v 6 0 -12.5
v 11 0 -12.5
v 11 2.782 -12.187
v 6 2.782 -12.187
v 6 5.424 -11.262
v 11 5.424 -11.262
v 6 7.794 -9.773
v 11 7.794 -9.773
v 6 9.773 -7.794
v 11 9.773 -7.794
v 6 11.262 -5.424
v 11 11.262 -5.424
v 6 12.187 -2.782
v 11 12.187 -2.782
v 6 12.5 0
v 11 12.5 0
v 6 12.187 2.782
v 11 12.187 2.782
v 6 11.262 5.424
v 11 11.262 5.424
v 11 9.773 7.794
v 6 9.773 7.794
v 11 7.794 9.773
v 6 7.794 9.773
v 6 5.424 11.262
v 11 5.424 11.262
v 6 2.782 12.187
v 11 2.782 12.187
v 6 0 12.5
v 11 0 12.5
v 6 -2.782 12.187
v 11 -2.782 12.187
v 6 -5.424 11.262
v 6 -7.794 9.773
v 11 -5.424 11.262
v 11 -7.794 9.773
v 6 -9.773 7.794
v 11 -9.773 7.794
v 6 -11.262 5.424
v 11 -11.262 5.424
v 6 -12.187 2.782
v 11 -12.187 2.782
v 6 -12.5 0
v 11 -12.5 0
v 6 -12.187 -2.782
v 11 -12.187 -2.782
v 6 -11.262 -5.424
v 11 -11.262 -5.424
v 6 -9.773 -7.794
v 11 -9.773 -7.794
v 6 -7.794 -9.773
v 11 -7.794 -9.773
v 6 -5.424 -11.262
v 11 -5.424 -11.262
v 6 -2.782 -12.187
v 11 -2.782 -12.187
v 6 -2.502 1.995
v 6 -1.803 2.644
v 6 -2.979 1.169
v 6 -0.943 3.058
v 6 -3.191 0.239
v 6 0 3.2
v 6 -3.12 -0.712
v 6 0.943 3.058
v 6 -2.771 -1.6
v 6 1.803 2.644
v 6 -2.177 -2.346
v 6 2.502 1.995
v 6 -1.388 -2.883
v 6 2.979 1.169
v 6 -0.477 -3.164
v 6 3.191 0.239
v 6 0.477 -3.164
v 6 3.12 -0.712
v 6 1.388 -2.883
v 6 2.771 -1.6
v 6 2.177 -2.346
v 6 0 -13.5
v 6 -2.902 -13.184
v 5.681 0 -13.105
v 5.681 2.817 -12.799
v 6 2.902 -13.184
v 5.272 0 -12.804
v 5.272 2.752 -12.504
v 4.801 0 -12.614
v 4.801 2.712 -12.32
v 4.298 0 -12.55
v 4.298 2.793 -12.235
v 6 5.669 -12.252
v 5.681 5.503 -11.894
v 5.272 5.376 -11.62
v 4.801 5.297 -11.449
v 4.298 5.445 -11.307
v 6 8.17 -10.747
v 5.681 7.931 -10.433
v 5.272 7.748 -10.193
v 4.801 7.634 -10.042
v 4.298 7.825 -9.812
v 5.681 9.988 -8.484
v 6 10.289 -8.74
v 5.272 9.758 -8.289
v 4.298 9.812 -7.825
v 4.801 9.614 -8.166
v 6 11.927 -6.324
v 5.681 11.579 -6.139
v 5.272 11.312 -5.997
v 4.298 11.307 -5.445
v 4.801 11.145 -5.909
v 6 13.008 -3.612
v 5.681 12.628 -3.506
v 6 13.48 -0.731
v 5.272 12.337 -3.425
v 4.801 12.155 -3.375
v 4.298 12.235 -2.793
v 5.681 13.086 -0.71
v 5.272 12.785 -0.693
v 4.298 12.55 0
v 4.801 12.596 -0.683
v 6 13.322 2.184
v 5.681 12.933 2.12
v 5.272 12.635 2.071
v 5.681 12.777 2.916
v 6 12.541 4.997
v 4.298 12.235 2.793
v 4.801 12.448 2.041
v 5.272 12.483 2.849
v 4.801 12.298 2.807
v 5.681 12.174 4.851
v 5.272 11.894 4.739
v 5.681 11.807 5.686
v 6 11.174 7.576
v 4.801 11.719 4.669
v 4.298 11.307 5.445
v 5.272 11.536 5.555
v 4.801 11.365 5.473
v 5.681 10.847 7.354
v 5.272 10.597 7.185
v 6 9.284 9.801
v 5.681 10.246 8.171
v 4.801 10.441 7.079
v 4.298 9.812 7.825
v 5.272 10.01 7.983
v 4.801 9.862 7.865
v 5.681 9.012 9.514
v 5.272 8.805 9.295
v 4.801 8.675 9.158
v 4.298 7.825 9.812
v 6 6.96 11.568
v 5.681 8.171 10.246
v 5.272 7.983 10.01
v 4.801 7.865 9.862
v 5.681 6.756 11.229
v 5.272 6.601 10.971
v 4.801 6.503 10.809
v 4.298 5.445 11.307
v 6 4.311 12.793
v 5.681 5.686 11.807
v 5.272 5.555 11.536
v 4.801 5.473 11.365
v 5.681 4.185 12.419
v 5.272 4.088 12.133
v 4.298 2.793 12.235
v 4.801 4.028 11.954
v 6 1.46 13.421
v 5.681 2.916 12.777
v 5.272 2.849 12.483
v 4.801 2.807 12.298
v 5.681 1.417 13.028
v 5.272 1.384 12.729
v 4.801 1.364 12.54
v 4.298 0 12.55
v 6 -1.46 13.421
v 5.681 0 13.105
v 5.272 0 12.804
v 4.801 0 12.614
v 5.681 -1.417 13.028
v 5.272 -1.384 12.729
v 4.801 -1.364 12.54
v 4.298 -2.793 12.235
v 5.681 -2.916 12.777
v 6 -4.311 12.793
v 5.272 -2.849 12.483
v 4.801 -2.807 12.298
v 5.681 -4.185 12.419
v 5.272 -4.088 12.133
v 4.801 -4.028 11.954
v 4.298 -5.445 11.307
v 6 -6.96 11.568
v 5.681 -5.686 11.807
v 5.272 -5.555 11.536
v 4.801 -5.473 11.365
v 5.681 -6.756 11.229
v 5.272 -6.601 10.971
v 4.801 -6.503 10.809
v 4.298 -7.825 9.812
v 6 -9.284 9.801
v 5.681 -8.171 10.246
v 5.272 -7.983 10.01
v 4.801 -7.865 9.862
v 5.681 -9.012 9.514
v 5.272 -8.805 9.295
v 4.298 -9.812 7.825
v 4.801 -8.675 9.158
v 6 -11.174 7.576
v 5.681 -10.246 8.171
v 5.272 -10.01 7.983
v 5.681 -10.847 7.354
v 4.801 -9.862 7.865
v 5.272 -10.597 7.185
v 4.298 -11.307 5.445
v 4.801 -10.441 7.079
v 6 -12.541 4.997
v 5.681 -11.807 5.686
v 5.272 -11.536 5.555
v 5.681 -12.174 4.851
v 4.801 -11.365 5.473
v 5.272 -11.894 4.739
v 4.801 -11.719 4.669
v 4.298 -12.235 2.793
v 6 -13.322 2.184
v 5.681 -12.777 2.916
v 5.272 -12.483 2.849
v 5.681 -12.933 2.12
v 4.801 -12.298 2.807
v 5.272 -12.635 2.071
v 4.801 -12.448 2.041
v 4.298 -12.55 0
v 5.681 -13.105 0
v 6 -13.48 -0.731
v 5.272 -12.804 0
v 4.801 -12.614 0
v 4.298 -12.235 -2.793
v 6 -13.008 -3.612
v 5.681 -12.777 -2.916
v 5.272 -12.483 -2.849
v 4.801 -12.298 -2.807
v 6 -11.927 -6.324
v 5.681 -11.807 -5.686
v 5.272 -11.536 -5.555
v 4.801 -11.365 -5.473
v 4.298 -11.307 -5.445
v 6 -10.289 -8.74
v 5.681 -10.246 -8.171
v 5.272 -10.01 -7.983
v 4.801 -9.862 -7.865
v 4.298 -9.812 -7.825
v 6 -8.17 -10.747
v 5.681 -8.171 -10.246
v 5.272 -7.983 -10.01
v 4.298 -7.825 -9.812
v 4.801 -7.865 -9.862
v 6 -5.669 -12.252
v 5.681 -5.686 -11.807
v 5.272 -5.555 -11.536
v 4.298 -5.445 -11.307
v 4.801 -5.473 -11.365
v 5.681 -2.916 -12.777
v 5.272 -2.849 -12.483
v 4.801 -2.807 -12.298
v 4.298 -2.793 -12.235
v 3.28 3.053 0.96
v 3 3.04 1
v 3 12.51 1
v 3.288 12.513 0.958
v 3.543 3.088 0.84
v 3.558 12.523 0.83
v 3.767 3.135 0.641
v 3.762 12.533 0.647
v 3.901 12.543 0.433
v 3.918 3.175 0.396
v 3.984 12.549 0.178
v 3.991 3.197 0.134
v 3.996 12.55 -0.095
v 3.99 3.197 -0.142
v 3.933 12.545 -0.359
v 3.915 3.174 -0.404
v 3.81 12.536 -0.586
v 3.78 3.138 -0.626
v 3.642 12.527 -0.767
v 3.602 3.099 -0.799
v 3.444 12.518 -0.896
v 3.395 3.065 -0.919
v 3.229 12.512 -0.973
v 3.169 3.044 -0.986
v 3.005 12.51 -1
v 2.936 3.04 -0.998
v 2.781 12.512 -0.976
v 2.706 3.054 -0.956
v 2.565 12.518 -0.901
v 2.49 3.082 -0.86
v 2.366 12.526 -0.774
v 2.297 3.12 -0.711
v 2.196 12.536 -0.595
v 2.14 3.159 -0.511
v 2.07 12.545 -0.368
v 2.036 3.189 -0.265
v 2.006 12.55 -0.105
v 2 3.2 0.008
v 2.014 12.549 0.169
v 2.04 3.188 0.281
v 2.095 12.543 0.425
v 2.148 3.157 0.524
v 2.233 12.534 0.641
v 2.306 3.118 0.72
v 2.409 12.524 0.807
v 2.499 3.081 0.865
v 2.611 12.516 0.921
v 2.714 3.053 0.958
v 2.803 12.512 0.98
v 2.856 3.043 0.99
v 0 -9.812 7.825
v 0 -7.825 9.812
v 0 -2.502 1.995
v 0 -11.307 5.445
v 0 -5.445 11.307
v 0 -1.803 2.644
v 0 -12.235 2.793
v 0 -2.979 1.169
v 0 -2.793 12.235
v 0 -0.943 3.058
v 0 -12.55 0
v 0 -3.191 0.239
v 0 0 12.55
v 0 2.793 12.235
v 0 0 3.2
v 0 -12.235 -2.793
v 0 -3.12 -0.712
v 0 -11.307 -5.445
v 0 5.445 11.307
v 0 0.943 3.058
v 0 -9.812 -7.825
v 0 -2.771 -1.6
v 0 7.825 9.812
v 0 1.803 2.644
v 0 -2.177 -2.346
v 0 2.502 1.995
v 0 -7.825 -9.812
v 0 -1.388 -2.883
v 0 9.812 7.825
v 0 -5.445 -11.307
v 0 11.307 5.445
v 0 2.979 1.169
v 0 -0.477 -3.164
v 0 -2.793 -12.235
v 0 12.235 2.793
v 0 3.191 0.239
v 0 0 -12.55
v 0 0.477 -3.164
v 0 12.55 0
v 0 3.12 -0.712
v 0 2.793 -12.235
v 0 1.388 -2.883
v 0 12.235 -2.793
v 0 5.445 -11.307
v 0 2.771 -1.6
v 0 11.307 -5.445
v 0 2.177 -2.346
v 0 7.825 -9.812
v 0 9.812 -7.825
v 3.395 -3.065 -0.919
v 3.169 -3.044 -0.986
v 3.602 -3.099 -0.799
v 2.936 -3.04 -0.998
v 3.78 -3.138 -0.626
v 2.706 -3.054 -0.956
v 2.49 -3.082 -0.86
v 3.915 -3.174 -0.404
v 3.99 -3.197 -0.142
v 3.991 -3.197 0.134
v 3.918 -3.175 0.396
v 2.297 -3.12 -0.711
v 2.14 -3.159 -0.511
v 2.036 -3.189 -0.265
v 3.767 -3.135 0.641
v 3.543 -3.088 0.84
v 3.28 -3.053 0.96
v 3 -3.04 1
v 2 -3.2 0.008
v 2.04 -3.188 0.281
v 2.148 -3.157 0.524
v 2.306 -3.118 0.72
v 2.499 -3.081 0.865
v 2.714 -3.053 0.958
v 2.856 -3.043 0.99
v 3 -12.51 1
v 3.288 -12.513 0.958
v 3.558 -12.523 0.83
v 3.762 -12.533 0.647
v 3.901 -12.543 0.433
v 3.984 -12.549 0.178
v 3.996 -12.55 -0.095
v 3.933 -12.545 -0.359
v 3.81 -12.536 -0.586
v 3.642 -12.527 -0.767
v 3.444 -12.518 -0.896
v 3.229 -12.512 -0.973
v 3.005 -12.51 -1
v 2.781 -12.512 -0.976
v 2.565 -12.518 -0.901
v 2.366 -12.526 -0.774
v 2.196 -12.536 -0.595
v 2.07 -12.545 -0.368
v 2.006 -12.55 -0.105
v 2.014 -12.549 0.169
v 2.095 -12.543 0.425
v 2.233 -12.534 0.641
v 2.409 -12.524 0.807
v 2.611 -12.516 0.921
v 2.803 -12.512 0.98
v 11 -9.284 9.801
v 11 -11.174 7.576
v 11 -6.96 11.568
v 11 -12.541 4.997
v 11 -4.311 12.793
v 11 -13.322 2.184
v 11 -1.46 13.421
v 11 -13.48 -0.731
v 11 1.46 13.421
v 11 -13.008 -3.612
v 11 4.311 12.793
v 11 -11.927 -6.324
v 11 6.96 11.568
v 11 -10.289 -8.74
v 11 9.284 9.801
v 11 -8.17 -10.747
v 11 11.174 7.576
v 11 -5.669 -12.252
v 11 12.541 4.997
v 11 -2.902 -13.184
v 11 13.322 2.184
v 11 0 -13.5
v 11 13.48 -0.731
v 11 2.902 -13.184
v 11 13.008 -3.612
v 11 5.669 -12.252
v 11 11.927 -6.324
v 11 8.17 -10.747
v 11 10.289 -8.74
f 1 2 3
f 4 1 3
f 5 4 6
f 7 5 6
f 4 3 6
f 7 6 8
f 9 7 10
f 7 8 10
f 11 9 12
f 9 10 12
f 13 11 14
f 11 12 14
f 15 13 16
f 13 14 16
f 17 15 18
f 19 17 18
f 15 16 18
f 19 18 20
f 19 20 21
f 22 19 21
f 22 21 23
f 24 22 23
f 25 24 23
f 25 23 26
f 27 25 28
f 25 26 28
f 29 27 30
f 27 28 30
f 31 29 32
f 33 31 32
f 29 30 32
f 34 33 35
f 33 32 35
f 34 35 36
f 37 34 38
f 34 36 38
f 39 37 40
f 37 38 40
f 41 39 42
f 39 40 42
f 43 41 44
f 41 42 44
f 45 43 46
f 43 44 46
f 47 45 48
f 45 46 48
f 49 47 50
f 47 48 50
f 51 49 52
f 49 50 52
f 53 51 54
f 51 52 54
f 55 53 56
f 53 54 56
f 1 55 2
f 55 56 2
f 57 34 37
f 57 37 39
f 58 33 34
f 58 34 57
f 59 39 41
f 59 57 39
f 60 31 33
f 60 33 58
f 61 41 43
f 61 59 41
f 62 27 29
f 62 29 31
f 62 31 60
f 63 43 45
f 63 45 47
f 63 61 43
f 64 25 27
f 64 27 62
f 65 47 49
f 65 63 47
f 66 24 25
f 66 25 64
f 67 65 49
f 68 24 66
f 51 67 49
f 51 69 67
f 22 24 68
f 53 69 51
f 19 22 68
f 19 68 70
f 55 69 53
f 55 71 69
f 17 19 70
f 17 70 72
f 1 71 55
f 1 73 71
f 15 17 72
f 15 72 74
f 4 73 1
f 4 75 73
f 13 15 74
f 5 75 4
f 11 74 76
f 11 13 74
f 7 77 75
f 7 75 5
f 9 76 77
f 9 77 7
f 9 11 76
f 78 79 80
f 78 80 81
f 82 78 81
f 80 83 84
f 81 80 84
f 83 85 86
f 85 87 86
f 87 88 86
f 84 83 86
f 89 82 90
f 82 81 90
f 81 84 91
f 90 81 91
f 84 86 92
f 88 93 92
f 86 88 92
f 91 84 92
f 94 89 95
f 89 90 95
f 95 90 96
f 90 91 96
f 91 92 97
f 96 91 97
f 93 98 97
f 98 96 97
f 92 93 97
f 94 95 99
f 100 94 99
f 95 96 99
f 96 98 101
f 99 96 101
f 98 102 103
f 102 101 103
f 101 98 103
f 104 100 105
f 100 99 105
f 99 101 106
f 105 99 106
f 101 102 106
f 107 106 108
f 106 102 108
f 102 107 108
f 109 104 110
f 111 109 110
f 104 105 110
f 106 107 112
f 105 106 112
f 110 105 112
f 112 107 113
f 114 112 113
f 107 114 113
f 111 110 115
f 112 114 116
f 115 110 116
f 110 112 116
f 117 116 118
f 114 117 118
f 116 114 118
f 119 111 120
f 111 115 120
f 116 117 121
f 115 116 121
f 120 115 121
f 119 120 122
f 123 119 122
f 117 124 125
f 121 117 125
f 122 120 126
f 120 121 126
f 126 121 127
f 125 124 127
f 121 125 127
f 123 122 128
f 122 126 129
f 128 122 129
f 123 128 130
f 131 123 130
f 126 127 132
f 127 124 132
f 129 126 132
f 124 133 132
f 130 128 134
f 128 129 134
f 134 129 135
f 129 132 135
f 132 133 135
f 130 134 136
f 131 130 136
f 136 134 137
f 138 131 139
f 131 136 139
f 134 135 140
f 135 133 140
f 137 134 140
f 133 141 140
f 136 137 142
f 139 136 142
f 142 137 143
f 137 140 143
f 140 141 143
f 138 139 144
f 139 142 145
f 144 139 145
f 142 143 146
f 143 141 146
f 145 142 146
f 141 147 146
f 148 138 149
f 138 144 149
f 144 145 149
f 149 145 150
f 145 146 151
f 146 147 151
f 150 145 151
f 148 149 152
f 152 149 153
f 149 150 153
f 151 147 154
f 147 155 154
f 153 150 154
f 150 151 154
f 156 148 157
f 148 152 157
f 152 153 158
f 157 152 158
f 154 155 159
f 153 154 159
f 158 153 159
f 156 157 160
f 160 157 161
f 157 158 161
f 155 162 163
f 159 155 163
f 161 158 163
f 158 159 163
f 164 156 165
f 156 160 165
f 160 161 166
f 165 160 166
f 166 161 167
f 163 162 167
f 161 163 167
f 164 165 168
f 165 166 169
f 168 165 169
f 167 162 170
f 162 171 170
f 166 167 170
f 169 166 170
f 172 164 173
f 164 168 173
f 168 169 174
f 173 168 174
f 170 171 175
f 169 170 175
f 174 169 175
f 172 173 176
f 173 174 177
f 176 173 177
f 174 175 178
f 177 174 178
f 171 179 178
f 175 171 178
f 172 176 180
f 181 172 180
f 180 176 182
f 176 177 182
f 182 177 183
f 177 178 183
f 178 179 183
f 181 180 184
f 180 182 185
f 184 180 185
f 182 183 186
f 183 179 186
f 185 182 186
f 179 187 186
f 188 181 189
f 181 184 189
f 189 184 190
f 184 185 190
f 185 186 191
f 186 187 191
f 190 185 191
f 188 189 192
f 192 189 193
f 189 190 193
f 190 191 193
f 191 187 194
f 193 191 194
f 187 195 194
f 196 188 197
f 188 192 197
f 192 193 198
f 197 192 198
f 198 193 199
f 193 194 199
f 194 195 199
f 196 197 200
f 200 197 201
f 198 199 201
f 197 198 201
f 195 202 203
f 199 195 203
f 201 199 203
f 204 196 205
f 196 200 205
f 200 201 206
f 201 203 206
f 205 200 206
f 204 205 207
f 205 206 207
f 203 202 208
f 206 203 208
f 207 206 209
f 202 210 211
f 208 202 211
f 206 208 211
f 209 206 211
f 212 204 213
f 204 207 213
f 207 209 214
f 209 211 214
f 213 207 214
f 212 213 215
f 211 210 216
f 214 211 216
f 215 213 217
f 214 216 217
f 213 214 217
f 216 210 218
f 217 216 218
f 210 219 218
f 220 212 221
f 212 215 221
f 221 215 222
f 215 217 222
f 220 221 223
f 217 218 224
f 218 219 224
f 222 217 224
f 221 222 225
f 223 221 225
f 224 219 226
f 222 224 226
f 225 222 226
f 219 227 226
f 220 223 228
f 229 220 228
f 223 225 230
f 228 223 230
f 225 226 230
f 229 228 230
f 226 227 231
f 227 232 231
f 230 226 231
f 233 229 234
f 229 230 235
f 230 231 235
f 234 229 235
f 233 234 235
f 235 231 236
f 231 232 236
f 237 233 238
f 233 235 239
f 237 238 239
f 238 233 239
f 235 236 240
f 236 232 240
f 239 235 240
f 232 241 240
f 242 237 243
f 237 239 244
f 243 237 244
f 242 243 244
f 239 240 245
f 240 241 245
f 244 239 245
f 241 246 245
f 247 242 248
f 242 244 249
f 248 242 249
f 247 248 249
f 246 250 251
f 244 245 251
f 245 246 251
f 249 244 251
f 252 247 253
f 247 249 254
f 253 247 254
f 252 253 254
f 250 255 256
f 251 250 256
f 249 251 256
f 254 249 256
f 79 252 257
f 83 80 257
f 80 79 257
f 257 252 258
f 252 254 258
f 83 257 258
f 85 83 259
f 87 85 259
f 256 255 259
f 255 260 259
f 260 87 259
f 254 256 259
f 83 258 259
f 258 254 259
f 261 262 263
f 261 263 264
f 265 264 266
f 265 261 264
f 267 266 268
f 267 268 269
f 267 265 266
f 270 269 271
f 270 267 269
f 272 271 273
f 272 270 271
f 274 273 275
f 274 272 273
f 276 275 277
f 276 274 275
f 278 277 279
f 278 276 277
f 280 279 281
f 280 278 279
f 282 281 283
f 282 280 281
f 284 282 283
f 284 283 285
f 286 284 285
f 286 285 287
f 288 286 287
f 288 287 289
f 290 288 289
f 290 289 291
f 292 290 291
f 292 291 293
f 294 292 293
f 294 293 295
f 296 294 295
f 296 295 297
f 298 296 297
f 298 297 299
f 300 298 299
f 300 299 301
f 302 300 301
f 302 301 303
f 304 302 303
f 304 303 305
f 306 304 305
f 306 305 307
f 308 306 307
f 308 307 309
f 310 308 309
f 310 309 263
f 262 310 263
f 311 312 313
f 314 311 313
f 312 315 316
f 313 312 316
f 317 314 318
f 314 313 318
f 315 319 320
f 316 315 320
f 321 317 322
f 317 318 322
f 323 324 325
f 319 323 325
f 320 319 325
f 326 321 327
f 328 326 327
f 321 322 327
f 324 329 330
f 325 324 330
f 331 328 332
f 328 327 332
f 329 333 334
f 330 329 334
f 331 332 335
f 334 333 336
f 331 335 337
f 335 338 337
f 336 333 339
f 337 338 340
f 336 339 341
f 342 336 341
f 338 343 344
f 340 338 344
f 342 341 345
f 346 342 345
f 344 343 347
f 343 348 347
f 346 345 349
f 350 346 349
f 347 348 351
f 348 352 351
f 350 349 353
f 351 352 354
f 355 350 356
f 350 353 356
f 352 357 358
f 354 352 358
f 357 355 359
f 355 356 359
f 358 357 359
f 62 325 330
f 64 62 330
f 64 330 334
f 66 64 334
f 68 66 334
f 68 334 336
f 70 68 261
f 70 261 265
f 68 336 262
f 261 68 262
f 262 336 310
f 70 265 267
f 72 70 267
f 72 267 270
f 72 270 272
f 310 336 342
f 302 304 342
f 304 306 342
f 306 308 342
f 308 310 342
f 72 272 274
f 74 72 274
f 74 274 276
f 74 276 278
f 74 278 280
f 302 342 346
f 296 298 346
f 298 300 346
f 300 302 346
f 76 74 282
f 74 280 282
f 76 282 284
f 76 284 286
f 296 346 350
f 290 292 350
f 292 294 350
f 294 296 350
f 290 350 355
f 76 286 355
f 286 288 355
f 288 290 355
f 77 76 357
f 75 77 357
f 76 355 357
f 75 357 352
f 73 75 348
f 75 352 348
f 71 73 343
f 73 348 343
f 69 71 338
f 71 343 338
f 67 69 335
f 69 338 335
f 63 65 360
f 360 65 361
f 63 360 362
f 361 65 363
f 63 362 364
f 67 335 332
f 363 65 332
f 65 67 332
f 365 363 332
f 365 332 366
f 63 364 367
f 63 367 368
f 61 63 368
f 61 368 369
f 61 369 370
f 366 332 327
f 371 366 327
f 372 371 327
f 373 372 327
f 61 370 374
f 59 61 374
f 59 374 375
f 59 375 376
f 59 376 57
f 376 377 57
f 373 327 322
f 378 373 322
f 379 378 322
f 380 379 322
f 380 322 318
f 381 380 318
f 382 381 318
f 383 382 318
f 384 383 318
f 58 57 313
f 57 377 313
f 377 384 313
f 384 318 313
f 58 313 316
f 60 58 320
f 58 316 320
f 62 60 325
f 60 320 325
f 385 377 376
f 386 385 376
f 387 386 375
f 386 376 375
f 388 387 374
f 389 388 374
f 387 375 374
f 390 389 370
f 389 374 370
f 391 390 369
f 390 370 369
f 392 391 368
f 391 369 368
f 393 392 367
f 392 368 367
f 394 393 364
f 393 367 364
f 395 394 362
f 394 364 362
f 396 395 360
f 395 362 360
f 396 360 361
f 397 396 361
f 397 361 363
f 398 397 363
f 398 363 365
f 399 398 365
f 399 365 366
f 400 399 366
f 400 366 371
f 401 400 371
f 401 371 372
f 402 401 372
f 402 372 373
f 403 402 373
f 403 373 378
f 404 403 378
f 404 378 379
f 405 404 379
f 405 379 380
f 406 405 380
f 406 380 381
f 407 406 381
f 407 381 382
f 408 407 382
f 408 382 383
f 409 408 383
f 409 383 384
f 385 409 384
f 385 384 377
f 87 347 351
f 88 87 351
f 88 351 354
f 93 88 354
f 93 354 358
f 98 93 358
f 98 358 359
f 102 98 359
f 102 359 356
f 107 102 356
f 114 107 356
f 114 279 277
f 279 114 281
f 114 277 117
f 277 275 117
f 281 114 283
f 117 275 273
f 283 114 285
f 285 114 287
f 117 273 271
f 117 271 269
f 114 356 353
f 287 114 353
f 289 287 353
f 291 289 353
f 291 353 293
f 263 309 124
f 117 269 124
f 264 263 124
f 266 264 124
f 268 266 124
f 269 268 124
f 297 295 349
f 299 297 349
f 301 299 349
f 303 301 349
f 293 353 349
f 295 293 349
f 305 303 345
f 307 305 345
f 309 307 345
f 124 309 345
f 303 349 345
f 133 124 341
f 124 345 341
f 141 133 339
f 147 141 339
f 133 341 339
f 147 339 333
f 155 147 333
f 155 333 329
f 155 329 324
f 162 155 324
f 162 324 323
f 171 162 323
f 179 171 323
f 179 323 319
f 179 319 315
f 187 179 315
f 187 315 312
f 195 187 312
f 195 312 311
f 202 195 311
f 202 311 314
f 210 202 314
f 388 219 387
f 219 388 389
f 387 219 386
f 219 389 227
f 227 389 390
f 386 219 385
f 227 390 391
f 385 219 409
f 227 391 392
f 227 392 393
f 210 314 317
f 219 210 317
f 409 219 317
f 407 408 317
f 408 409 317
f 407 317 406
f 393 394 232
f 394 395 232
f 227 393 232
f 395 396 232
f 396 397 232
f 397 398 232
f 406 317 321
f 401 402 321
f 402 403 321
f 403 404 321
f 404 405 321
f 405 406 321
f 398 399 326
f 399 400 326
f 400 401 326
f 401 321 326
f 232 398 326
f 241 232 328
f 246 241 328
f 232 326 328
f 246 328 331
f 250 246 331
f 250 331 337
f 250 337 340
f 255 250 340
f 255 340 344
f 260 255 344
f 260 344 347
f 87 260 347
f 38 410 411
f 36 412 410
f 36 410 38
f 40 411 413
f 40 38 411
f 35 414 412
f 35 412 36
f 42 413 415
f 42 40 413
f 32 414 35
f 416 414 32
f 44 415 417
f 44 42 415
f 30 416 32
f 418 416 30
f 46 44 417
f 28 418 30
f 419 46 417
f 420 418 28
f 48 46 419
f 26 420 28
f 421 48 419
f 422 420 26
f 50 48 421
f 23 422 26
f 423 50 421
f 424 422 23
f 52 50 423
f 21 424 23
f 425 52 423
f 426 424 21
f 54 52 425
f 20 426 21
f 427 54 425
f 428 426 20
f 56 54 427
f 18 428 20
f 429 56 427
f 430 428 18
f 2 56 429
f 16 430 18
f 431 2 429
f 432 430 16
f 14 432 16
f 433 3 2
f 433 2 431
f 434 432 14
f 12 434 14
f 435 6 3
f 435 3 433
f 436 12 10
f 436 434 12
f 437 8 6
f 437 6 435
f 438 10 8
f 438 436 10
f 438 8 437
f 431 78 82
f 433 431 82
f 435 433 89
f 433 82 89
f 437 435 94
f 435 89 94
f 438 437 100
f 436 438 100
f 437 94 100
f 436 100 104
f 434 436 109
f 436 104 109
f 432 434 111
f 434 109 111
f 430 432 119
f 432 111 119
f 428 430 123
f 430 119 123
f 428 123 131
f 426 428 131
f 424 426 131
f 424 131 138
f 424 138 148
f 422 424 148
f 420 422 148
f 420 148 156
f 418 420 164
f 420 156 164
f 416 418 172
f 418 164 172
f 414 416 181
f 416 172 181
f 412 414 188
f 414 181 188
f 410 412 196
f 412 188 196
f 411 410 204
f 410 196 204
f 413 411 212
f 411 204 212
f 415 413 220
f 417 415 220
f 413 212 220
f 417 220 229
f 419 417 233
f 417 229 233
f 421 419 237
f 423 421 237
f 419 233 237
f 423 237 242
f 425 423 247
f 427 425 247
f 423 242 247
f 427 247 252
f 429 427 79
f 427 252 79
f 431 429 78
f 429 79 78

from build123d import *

# Parameters (mm, degrees)
SKETCH_1_R                      = 12.55
EXTRUDE_1_DEPTH                 = 6
SKETCH_2_R                      = 3.2
CUT_EXTRUDE_1_DEPTH             = 6
CUT_EXTRUDE_2_REACH             = 20.735
SKETCH_3_R                      = 1
CUT_EXTRUDE_2_DIRECTION_2_REACH = 20.735
SKETCH_4_R                      = 13.5
EXTRUDE_2_DEPTH                 = 5
SKETCH_5_R                      = 12.5
CUT_EXTRUDE_3_DEPTH             = 5
FILLET_2_R                      = 2


with BuildPart() as part:
    # 草图1 → 凸台-拉伸1 (new body)
    with BuildSketch(Plane(origin=(0, 0, 0), x_dir=(0, 0, -1), z_dir=(1, 0, 0))):
        Circle(SKETCH_1_R)
    extrude(amount=EXTRUDE_1_DEPTH)

    # 草图2 → 切除-拉伸1 (cut)
    with BuildSketch(Plane.ZY):
        Circle(SKETCH_2_R)
    extrude(amount=-CUT_EXTRUDE_1_DEPTH, mode=Mode.SUBTRACT)

    # 草图3 → 切除-拉伸2 (cut, up to next)
    with BuildSketch(Plane(origin=(0, 0, 0), x_dir=(1, 0, 0), z_dir=(0, 1, 0)), mode=Mode.PRIVATE) as cut_extrude_2_sk1:
        with Locations(Location((3, 0, 0), (0, 0, 270))):
            Circle(SKETCH_3_R)
    cut_extrude_2_tool1 = extrude(cut_extrude_2_sk1.sketch, amount=-CUT_EXTRUDE_2_REACH, mode=Mode.PRIVATE) & part.part
    add(cut_extrude_2_tool1.solids().sort_by_distance((3, 0, 0))[0], mode=Mode.SUBTRACT)

    # 草图3 → 切除-拉伸2 direction 2 (cut, up to next)
    with BuildSketch(Plane(origin=(0, 0, 0), x_dir=(1, 0, 0), z_dir=(0, 1, 0)), mode=Mode.PRIVATE) as cut_extrude_2_direction_2_sk1:
        with Locations(Location((3, 0, 0), (0, 0, 270))):
            Circle(SKETCH_3_R)
    cut_extrude_2_direction_2_tool1 = extrude(cut_extrude_2_direction_2_sk1.sketch, amount=CUT_EXTRUDE_2_DIRECTION_2_REACH, mode=Mode.PRIVATE) & part.part
    add(cut_extrude_2_direction_2_tool1.solids().sort_by_distance((3, 0, 0))[0], mode=Mode.SUBTRACT)

    # 草图4 → 凸台-拉伸2 (add)
    with BuildSketch(Plane(origin=(6, 0, 0), x_dir=(0, 0, -1), z_dir=(1, 0, 0))):
        Circle(SKETCH_4_R)
    extrude(amount=EXTRUDE_2_DEPTH)

    # 草图5 → 切除-拉伸3 (cut)
    with BuildSketch(Plane(origin=(11, 0, 0), x_dir=(0, 0, -1), z_dir=(1, 0, 0))):
        Circle(SKETCH_5_R)
    extrude(amount=-CUT_EXTRUDE_3_DEPTH, mode=Mode.SUBTRACT)

    # 圆角2
    # the kernel refuses this fillet: 2 mm, written as the material it adds along each edge
    with BuildSketch(Plane(origin=(6, 0, 0), x_dir=(0, 0, -1), z_dir=(0, -1, 0))) as fillet_2_piece_1:
        with BuildLine():
            CenterArc((14.55, -1.702204453), FILLET_2_R, 121.668243254, 58.331756746)
            Line((12.55, -1.702204453), (12.51, -1.702204453))
            Line((12.51, -1.702204453), (12.51, 0))
            Line((12.51, 0), (12.55, 0.04))
            ThreePointArc((12.55, 0.04), (13.025, 0.04), (13.479, 0.034044089))
            Line((13.479, 0.034044089), (13.5, 0))
        make_face()
    revolve(axis=Axis((6, 0, 0), (1, 0, 0)))


solid = part.part
